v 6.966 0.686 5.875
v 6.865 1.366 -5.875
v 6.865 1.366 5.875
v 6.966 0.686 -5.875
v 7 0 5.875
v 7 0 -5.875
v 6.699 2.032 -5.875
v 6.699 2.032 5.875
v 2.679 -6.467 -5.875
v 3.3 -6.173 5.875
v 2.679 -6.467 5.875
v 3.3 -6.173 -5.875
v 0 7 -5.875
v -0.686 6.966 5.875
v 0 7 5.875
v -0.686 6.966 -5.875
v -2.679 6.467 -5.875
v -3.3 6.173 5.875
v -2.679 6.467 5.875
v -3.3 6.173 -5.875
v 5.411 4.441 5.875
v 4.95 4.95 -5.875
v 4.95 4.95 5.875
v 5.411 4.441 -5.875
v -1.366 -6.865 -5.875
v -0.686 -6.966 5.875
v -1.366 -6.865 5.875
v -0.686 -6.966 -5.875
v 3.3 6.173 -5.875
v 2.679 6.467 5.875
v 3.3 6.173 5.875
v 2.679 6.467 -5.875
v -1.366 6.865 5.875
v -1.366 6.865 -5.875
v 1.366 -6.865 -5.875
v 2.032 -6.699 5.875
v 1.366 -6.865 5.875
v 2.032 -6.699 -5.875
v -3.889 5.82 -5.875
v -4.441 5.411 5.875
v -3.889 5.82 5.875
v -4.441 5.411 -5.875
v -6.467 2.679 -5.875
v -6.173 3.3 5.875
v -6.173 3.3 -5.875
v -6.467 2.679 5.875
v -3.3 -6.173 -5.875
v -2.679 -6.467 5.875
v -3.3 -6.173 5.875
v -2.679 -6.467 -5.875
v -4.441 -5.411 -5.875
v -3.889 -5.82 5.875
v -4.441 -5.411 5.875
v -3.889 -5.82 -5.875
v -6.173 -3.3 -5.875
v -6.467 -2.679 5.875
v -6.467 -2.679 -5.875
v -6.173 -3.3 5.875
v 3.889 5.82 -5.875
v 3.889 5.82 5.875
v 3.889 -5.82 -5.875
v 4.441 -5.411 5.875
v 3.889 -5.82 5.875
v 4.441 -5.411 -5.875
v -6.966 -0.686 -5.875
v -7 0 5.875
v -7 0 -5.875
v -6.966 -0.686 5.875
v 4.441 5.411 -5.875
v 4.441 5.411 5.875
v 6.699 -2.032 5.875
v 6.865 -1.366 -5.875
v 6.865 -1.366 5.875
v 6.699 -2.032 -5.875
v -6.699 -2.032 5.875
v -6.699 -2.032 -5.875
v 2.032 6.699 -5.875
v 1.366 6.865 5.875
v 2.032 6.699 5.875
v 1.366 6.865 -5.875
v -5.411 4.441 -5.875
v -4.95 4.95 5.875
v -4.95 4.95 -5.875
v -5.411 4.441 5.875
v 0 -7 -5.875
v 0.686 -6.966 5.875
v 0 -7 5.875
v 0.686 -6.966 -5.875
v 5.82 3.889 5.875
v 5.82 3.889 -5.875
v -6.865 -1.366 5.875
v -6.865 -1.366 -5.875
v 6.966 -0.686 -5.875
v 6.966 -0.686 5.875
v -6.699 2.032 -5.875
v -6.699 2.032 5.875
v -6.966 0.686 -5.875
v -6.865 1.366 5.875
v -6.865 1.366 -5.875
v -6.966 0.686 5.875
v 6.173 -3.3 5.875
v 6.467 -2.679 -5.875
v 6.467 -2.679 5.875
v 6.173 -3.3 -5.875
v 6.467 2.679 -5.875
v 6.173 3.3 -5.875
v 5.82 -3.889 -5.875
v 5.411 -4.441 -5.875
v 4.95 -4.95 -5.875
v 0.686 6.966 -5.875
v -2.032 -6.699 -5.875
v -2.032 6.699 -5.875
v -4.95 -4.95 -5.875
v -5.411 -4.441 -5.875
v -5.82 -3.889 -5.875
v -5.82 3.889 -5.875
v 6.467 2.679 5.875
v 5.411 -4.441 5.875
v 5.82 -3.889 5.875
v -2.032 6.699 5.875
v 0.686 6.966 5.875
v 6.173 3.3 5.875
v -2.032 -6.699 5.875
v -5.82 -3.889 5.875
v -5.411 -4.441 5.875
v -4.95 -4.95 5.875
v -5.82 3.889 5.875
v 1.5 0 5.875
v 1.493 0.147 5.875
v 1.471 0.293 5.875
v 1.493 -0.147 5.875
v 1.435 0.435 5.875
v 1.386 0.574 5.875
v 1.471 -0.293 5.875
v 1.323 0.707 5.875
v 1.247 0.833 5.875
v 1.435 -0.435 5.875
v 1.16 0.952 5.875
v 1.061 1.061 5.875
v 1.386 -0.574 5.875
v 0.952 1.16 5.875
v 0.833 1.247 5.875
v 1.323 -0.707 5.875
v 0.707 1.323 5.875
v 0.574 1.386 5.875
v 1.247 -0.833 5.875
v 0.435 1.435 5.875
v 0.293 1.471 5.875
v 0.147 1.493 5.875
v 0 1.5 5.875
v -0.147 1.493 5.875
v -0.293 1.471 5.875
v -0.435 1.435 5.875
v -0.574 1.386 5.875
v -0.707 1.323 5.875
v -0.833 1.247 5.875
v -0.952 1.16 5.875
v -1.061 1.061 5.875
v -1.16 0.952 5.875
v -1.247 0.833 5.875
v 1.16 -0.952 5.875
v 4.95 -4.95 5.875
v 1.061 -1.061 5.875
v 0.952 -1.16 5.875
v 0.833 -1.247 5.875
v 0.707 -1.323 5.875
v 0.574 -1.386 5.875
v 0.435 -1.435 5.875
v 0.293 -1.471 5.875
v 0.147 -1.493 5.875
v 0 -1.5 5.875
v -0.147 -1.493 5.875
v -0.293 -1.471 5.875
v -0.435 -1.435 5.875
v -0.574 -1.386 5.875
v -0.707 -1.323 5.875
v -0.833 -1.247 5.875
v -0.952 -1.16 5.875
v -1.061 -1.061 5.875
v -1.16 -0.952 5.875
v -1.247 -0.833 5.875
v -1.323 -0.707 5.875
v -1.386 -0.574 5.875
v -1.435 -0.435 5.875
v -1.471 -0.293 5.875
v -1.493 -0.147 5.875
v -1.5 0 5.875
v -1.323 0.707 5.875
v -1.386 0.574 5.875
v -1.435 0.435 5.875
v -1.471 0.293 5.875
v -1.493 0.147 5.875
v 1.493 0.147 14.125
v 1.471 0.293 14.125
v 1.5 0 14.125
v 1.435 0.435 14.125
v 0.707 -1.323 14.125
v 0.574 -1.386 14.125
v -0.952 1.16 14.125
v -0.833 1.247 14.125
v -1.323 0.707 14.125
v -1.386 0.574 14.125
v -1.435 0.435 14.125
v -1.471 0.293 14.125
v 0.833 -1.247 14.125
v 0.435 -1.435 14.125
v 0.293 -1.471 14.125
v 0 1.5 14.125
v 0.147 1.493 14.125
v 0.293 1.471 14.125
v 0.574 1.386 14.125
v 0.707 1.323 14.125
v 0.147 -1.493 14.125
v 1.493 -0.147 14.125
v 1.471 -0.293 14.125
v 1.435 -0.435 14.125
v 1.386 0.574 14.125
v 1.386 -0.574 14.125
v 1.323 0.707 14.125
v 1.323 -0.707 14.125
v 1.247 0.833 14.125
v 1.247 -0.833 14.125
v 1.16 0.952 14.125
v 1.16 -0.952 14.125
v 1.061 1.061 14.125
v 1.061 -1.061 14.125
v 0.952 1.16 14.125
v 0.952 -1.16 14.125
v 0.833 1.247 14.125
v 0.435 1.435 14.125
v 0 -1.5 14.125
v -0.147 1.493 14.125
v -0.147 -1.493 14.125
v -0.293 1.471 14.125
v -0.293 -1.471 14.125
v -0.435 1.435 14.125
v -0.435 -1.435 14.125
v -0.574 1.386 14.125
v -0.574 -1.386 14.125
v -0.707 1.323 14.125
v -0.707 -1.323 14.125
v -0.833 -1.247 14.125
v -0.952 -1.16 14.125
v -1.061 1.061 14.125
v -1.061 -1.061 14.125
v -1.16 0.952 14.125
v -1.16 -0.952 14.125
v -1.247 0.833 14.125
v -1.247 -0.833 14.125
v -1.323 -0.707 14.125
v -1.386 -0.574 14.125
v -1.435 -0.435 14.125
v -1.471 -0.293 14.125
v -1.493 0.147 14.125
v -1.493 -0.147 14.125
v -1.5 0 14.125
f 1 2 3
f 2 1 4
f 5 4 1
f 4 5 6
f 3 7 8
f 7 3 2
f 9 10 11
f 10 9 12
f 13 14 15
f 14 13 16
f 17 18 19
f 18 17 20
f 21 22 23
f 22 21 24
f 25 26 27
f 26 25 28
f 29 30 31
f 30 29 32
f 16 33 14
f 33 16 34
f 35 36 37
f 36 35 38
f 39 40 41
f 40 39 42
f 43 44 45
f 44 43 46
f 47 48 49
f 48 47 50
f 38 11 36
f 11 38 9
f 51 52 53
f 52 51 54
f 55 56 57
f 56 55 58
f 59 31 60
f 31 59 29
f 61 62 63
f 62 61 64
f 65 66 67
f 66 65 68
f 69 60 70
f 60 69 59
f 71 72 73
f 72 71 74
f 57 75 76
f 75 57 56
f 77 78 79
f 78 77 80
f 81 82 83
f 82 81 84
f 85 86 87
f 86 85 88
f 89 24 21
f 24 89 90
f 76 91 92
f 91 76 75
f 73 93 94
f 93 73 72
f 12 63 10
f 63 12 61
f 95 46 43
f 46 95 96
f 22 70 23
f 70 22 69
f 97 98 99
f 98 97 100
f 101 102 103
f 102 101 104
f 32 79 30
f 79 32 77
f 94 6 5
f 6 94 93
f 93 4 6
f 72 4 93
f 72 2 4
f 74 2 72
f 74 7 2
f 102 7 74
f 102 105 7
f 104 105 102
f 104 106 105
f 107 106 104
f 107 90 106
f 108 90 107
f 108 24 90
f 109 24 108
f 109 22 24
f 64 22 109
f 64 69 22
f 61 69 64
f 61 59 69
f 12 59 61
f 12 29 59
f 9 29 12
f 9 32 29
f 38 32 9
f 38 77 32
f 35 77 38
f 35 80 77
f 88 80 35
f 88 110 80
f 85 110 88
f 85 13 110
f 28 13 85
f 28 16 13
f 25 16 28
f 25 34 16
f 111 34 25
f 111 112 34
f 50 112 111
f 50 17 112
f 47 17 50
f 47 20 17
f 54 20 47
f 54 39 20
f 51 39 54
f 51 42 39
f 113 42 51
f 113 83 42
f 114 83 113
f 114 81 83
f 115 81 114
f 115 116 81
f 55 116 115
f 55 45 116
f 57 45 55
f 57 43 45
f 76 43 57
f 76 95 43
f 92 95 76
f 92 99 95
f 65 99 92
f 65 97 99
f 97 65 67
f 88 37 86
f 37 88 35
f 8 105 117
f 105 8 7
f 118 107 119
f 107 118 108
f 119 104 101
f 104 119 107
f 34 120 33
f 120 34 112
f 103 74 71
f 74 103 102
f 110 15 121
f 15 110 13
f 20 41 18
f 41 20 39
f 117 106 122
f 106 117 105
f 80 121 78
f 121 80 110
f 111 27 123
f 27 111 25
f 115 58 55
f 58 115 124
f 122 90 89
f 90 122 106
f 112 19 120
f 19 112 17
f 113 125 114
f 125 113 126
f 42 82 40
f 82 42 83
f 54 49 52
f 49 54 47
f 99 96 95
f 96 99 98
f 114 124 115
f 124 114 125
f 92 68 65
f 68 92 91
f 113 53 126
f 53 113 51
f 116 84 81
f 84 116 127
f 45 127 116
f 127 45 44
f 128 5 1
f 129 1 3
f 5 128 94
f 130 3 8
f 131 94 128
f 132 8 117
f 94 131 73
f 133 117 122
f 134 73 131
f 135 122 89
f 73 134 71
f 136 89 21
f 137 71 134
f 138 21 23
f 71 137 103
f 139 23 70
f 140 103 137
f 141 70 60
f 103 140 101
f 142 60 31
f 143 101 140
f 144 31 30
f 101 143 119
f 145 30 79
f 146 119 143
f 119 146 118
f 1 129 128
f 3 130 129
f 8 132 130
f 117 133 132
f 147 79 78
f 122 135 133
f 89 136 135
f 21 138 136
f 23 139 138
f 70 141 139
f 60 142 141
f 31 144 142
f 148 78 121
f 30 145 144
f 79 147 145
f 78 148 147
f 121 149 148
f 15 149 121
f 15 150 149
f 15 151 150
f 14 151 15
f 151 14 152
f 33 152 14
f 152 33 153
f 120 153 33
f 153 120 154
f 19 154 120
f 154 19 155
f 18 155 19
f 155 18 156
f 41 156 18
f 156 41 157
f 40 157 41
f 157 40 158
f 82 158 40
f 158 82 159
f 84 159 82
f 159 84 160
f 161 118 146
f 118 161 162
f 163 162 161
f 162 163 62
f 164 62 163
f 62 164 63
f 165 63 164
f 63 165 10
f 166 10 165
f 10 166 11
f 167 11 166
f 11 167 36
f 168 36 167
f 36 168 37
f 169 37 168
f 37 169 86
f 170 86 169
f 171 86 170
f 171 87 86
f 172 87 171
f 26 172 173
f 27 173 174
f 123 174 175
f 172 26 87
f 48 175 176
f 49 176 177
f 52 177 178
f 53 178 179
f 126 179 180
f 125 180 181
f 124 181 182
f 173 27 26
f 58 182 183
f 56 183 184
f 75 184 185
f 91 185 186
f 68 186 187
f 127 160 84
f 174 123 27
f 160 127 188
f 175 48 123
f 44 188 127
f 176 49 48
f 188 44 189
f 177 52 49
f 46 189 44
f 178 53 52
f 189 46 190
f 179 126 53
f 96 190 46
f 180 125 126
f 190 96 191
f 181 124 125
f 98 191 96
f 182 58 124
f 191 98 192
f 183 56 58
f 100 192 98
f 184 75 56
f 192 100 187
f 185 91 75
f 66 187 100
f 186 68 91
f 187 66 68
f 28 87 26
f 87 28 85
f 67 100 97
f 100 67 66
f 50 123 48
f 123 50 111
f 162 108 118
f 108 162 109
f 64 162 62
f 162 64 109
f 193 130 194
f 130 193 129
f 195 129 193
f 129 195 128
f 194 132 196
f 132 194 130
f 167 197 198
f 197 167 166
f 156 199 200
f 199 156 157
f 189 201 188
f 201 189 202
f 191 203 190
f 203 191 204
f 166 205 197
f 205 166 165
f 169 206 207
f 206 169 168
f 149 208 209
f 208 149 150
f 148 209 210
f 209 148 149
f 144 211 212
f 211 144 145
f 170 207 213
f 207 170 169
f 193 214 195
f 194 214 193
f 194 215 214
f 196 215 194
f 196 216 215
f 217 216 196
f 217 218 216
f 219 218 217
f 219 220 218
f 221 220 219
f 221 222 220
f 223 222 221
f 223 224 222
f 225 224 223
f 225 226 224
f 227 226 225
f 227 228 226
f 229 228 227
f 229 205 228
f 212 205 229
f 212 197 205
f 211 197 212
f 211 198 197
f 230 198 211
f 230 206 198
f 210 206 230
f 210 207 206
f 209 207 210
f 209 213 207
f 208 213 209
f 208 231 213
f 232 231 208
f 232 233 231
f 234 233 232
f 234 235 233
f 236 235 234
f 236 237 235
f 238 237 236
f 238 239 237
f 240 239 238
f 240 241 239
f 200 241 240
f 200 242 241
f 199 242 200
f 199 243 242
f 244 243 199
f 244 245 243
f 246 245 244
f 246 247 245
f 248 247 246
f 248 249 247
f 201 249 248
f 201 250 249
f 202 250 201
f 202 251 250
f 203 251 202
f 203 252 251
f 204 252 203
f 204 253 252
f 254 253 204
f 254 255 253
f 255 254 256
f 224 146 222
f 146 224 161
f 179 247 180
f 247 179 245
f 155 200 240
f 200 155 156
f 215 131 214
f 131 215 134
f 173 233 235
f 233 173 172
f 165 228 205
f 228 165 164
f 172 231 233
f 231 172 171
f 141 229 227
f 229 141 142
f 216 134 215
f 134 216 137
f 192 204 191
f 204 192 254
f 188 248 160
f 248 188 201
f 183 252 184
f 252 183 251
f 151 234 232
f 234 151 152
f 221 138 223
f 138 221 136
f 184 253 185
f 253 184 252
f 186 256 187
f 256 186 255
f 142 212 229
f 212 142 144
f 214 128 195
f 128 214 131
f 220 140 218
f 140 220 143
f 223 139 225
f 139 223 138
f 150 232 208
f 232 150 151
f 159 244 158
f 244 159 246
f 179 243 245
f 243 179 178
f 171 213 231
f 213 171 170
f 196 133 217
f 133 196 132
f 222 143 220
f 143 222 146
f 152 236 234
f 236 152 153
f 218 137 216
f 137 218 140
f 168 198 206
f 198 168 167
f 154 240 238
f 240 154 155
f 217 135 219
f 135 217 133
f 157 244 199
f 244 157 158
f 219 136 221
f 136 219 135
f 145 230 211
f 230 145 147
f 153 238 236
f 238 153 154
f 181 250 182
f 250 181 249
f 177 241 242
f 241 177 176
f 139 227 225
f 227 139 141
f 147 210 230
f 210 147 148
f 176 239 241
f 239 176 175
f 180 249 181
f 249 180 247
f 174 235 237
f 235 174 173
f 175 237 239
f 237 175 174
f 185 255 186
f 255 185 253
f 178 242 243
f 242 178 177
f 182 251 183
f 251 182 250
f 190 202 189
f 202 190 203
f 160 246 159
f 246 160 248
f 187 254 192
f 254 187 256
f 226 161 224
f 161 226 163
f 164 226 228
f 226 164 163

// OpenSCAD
module brushless_dc_motor() {
    union() {
        // Stator
        translate([0, 0, -11.75/2])
            cylinder(d=14.0, h=11.75, $fn=64);
        
        // Rotor
        translate([0, 0, -11.75/2])
            cylinder(d=12.0, h=11.75, $fn=64);
        
        // Shaft
        translate([0, 0, -11.75/2])
            cylinder(d=3.0, h=20.0, $fn=64);
    }
}

brushless_dc_motor();
